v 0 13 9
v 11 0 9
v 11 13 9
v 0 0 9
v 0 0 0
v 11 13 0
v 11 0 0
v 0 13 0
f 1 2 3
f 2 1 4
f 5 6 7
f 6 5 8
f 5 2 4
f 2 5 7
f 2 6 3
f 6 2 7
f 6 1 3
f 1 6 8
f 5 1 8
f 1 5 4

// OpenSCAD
// Generated by SolidPython 1.0.1 on 2020-07-29 00:46:55


cube(size = [11, 13, 9]);
/***********************************************
*********      SolidPython code:      **********
************************************************
 
# import packages: SolidPython
from solid import *
from solid.utils import *
from itertools import chain, combinations, permutations


class Resize:

    def __init__(self, scad_file):
        self.scad_file = scad_file
        #self.scad_file = import_scad(scad_file)
        # cone/cylinder param:
        self.r1 = 0
        self.r2 = 0
        self.h = 0
        # rectangular prism param:
        self.w = 0
        self.l = 0
        # ellipse param:
        self.r = 0

    # import OpenScad code (file name corresponds to shape)


    # classify shape + parameters
    def assign(self, param1, param2, param3):
        if self.scad_file == 'cone.scad':
            self.r1 = param1
            self.r2 = param2
            self.h = param3
        elif self.scad_file == 'cylinder.scad':
            self.r1 = param1
            self.r2 = param2
            self.h = param3
        elif self.scad_file == 'rectangularPrism.scad':
            self.h = param1
            self.l = param2
            self.w = param3
        else:
            self.r = param1
            self.h = param2

    # resize parameters
    def iterate(self):
        x = range(3, 20, 2)
        i = 1
        if self.scad_file == 'cone.scad':
            tempList = list(permutations(x, 2))
            for temp in tempList:
                param1 = temp[0]
                param2 = temp[1]
                filepath = 'produced_scad_files/' + 'cone' + str(param1) + '_' + str(param2) + '_' + '.scad'
                scad_render_to_file(cylinder(h=param1, r1=param2, r2=0), filepath)

        elif self.scad_file == 'cylinder.scad':
            tempList = list(permutations(x, 3))
            for temp in tempList:
                param1 = temp[0]
                param2 = temp[1]
                filepath = 'produced_scad_files/' + 'cylinder' + str(param1) + '_' + str(param2) + '_' + '.scad'
                scad_render_to_file(cylinder(h=param1, r1=param2, r2=param2), filepath)

        elif self.scad_file == 'rectangularPrism.scad':
            tempList = list(permutations(x, 3))
            for temp in tempList:
                param1 = temp[0]
                param2 = temp[1]
                param3 = temp[2]
                filepath = 'produced_scad_files/' + 'rectangularPrism' + str(param1) + '_' + str(param2) + '_' + str(
                    param3) + '.scad'
                scad_render_to_file(cube(size=(param1, param2, param3)), filepath)

        elif self.scad_file == 'ellipse.scad':
            tempList = list(permutations(x, 4))
            for temp in tempList:
                param1 = temp[0]
                param2 = temp[1]
                param3 = temp[2]
                param4 = temp[3]
                filepath = 'produced_scad_files/' + 'ellipse' + str(param1) + '_' + str(param2) + '_' + str(param3) + '_' + str(param4) + '.scad'
                scad_render_to_file(scale([param1, param2, param3])(sphere(r=param4)), filepath)

    def render_to_scadfile(self):
        scad_render_to_file(scad, 'example.scad') 
 
************************************************/
